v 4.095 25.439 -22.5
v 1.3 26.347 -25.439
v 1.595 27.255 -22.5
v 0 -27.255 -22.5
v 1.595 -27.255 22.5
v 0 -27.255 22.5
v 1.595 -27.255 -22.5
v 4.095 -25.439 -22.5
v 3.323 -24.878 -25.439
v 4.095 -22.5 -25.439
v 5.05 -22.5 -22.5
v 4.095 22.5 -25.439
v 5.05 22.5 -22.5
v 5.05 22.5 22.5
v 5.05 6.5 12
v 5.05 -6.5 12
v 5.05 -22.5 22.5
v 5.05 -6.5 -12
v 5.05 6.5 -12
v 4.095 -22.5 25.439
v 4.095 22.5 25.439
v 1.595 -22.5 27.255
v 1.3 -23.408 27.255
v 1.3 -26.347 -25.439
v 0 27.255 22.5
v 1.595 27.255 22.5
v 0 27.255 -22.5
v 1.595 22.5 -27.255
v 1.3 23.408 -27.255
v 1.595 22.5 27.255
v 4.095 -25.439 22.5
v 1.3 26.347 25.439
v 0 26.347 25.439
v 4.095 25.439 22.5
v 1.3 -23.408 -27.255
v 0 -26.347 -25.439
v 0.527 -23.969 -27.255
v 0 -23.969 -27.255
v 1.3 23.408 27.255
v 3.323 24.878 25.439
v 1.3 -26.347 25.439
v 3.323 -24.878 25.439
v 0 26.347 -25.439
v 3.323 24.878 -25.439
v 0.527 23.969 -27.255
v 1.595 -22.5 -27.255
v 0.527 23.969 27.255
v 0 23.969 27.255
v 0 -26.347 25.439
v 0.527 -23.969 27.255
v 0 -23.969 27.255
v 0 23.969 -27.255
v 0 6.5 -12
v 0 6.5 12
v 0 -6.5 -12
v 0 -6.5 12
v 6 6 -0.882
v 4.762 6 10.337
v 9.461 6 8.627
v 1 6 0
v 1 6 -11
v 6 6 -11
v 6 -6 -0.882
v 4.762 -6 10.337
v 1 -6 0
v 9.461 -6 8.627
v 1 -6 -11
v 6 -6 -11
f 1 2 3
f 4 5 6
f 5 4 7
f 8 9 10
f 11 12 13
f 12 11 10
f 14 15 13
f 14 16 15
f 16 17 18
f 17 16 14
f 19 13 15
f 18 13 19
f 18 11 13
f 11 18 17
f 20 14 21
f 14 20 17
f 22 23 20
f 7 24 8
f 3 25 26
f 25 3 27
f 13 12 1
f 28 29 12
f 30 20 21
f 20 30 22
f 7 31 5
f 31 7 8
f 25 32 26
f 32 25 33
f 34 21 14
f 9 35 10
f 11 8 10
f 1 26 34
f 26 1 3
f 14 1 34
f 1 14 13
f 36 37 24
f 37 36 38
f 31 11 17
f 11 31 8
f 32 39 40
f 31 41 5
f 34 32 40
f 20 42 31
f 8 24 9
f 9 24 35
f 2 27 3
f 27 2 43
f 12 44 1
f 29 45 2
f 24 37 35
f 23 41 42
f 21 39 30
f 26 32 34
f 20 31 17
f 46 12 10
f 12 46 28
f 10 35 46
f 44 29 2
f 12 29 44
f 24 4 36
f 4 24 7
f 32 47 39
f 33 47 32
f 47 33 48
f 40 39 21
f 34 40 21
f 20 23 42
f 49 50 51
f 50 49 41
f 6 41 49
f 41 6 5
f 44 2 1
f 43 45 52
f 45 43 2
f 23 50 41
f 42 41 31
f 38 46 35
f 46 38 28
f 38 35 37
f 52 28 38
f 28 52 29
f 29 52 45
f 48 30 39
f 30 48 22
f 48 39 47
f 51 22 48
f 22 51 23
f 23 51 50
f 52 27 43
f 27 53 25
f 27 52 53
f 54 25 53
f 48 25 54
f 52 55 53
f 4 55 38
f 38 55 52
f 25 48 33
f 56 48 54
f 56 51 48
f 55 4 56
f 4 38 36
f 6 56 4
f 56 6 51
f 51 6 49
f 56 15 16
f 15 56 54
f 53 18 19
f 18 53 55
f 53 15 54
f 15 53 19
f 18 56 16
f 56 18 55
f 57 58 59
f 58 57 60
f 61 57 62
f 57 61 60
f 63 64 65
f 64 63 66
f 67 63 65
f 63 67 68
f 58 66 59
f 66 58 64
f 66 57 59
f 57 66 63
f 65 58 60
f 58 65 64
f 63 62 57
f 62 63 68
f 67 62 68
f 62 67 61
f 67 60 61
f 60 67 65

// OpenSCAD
module LightSwitchBody () {
  difference() {
    intersection() {
      minkowski() {
        cube([0.1, 45, 45], true);
        sphere(5);
      }
    }
    translate([-5, 0, 0])
    cube([10, 100, 100], true);
    cube([21, 13, 24], true);
  }
}

module LightSwitchButton () {
  translate([1, -6, 0])
    rotate([0, 20, 0]) cube([5, 12, 11]); 
  translate([1, -6, -11]) cube([5, 12, 11]);
}

$fn=10;

LightSwitchBody();
LightSwitchButton();
